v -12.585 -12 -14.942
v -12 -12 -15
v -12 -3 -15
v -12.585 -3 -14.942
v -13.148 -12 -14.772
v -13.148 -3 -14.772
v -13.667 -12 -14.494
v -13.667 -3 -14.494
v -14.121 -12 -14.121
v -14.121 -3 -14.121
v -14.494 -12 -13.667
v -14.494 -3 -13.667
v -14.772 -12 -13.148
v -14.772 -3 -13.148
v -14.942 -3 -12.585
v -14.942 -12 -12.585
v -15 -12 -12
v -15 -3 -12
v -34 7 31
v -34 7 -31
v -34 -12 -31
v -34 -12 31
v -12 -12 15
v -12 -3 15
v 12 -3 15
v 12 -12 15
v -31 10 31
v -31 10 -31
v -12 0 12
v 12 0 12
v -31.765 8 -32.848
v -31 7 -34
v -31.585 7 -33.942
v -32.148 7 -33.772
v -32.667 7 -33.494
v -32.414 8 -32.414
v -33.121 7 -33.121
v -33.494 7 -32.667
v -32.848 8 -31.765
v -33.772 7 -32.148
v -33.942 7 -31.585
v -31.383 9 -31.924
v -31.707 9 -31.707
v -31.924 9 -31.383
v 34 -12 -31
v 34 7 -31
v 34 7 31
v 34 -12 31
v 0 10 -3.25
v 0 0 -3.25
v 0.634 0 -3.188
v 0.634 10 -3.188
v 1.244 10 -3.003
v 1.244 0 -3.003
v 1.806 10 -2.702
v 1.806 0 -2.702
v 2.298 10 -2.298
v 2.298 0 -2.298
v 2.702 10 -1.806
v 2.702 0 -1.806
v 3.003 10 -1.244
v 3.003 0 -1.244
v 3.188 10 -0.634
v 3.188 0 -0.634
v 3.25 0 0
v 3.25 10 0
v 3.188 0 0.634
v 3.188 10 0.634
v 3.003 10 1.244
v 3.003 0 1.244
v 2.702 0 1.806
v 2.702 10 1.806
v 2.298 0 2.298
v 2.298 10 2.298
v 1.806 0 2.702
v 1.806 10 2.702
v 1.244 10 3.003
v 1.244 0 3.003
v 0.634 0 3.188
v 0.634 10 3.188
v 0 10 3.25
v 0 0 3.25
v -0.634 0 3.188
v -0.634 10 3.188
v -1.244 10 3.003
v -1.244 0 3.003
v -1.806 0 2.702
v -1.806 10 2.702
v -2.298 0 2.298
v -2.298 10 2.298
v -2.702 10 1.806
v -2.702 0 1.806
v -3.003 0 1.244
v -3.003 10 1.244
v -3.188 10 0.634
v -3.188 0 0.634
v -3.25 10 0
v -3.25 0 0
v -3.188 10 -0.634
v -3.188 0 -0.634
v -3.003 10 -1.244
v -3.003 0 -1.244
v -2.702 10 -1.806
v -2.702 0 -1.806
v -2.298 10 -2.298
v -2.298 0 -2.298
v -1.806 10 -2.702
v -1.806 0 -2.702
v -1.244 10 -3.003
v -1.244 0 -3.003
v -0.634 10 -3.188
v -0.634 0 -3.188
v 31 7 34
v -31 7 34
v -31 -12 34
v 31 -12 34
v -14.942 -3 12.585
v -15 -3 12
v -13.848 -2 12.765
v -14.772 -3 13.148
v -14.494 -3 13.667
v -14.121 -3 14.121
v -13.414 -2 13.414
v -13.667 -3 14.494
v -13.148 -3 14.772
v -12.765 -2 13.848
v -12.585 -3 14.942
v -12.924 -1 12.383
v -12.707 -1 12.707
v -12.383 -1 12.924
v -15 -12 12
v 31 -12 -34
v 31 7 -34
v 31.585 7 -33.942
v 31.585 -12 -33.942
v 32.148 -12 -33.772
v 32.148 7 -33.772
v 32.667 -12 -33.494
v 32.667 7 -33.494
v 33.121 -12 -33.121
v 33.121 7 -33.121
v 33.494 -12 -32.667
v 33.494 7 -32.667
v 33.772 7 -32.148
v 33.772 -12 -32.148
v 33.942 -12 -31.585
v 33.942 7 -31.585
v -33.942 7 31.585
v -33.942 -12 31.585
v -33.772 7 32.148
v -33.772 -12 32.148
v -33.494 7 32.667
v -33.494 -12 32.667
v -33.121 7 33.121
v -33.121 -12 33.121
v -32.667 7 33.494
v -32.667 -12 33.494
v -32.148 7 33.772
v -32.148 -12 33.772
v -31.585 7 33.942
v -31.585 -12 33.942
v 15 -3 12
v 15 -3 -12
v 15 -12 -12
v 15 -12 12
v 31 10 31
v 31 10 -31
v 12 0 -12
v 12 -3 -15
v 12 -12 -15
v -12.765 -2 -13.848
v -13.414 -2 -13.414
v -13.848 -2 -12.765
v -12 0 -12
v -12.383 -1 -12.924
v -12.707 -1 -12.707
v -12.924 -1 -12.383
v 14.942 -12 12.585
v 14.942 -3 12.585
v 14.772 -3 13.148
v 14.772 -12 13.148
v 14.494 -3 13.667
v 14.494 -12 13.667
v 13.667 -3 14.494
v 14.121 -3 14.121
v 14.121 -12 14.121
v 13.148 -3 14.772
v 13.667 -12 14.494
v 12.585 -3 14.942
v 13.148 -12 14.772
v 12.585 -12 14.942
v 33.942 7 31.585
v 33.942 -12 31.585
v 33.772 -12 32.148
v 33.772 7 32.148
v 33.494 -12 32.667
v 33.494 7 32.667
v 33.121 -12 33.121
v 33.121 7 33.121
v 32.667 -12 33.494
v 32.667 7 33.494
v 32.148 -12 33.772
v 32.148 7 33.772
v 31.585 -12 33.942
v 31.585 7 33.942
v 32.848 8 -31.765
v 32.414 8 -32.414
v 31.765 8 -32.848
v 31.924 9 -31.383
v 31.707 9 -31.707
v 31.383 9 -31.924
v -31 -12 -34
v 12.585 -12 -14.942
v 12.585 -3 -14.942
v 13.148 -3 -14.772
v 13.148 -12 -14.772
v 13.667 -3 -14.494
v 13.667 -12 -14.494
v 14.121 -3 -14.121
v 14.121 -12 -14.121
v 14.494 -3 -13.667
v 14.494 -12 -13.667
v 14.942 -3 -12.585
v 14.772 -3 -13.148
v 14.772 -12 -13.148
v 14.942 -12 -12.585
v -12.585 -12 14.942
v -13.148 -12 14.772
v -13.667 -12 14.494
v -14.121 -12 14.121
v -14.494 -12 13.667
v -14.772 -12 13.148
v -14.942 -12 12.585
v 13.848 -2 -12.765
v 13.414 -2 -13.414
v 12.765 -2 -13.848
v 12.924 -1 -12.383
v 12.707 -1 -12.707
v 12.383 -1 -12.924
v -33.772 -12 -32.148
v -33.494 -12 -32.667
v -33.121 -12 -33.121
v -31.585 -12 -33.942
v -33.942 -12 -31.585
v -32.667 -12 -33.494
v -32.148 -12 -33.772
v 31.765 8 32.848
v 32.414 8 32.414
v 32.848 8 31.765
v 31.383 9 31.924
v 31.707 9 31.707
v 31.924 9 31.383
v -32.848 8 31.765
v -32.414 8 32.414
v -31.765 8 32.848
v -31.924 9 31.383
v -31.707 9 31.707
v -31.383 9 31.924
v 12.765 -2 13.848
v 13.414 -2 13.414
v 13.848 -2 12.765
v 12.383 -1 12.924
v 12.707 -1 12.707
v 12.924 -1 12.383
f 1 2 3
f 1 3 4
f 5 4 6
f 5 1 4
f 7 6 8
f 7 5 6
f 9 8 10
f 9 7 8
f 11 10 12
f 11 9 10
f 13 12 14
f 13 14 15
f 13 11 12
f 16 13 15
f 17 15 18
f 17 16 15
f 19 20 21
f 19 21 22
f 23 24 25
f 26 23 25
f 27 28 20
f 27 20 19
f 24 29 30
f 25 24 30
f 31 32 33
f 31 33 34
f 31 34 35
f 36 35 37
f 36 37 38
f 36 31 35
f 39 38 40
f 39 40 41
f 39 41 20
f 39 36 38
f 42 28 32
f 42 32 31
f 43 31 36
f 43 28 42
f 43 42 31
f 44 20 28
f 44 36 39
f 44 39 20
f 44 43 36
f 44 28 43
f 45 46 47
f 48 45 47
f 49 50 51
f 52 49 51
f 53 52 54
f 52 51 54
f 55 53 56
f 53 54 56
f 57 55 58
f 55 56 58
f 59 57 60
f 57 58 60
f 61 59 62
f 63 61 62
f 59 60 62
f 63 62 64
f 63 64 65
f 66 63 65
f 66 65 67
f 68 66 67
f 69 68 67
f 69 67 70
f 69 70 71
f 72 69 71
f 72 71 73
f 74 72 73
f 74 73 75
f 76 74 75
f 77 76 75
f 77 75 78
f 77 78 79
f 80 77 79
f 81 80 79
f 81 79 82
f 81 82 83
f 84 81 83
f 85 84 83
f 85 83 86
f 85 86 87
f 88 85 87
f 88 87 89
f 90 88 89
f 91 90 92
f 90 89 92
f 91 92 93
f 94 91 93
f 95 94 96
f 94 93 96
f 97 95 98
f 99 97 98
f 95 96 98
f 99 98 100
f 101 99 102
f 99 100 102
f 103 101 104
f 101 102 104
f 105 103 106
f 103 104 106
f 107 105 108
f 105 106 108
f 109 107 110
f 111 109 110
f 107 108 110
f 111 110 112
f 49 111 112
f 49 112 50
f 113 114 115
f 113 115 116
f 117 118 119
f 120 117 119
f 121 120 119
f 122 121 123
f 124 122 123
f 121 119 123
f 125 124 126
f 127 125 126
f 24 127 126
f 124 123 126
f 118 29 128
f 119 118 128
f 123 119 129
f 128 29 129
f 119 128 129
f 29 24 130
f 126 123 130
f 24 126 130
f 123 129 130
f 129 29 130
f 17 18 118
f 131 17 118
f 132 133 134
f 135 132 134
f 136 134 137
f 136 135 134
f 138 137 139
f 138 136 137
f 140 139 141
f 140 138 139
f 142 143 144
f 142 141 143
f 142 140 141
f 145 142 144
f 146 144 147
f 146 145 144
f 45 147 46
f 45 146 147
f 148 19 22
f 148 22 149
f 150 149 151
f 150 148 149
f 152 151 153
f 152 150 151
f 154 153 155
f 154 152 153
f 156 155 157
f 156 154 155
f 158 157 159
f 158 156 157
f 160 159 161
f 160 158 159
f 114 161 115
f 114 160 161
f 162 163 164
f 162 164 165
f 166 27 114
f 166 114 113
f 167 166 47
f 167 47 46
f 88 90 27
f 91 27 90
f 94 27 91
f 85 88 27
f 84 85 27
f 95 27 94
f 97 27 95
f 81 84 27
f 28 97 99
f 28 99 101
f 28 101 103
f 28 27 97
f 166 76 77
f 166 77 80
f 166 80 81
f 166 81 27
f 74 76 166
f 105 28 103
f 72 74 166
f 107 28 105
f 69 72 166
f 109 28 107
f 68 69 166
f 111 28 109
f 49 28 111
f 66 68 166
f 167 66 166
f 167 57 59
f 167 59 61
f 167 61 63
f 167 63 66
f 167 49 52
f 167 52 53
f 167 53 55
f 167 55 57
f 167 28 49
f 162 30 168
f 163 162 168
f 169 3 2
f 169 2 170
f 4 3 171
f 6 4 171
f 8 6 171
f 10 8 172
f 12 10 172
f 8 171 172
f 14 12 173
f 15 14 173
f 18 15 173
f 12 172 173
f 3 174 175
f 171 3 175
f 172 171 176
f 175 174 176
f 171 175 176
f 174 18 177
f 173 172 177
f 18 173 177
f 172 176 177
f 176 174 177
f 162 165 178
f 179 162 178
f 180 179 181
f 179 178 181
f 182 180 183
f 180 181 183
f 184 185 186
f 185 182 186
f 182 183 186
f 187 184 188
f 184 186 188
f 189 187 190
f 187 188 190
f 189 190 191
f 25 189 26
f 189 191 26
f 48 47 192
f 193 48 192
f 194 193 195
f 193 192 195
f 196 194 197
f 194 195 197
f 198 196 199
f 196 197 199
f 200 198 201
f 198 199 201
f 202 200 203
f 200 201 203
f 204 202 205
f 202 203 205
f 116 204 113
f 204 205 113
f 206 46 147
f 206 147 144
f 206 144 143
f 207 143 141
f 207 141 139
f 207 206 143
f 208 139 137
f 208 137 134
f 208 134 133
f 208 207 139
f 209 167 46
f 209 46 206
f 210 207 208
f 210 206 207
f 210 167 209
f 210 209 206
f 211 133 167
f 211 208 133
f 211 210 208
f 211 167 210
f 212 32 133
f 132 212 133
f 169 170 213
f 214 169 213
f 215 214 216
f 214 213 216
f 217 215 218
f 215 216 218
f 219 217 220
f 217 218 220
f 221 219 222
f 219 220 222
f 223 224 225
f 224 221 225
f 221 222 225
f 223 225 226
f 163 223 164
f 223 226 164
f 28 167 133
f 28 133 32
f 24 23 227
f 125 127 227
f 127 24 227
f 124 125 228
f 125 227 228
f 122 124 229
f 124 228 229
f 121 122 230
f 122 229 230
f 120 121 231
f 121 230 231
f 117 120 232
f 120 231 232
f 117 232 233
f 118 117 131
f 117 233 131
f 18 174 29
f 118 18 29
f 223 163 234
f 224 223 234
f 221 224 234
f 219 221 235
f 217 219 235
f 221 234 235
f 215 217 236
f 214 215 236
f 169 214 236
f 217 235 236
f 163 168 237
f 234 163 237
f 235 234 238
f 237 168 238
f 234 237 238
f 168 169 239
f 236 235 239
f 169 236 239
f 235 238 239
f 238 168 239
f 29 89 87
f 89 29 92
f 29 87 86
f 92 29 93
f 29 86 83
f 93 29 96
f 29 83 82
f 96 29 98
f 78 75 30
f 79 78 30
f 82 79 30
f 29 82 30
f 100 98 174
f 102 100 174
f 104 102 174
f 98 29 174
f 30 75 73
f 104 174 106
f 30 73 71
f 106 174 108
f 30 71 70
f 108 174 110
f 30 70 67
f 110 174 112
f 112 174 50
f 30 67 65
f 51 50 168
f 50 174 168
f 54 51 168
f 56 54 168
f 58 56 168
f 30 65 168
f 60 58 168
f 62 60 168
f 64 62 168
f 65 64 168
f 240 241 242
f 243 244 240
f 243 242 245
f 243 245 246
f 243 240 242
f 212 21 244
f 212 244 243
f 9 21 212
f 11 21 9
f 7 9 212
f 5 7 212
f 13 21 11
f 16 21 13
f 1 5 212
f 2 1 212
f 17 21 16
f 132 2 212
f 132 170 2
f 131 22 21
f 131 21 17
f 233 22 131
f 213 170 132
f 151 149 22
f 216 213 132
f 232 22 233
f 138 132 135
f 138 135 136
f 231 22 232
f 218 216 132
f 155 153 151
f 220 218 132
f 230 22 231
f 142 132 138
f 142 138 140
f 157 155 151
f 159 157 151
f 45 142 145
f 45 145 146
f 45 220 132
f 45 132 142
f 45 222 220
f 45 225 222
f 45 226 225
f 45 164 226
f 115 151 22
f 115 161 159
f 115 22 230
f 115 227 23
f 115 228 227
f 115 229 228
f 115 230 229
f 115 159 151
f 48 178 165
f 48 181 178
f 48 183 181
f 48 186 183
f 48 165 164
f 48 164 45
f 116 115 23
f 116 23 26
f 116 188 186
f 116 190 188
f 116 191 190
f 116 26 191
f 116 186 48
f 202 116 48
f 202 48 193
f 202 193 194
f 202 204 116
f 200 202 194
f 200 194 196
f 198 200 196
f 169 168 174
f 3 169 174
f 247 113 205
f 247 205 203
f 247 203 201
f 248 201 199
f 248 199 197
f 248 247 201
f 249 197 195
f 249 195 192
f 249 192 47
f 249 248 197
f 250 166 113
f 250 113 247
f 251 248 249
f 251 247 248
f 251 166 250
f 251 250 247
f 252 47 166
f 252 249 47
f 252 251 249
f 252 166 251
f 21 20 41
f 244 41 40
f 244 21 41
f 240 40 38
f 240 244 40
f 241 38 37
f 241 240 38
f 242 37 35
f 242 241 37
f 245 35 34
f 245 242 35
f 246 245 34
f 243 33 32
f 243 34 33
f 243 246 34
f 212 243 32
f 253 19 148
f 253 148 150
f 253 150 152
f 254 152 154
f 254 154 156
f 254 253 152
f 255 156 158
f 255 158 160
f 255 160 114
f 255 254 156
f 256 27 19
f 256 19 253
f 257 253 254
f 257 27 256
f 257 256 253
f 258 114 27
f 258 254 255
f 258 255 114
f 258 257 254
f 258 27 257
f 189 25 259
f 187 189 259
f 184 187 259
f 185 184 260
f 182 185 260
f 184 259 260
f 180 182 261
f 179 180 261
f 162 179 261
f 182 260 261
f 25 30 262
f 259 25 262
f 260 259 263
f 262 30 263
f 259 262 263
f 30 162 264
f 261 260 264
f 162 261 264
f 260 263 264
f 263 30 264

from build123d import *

# Parameters (mm, degrees)
SKETCH1_W           = 68
SKETCH1_H           = 68
BOSS_EXTRUDE1_DEPTH = 10
SKETCH4_W           = 68
SKETCH4_H           = 68
SKETCH4_W_2         = 30
SKETCH4_H_2         = 30
BOSS_EXTRUDE3_DEPTH = 12
FILLET2_R           = 3
FILLET3_R           = 3
SKETCH5_R           = 3.25
CUT_EXTRUDE2_DEPTH  = 20
CHAMFER1_SIZE       = 3
CHAMFER2_SIZE       = 3


with BuildPart() as part:
    # Sketch1 → Boss-Extrude1 (new body)
    with BuildSketch(Plane(origin=(0, 0, 0), x_dir=(1, 0, 0), z_dir=(0, 1, 0))):
        Rectangle(SKETCH1_W, SKETCH1_H)
    extrude(amount=BOSS_EXTRUDE1_DEPTH)

    # Sketch4 → Boss-Extrude3 (add)
    with BuildSketch(Plane.XZ):
        Rectangle(SKETCH4_W, SKETCH4_H)
        Rectangle(SKETCH4_W_2, SKETCH4_H_2, mode=Mode.SUBTRACT)
    extrude(amount=BOSS_EXTRUDE3_DEPTH)

    # Fillet2
    fillet2_edges = [part.edges().sort_by_distance(p)[0] for p in [
        (34, -1, 34),
        (-34, -1, 34),
        (-34, -1, -34),
        (34, -1, -34),
    ]]
    fillet(fillet2_edges, radius=FILLET2_R)

    # Fillet3
    fillet3_edges = [part.edges().sort_by_distance(p)[0] for p in [
        (15, -6, 15),
        (-15, -6, 15),
        (-15, -6, -15),
        (15, -6, -15),
    ]]
    fillet(fillet3_edges, radius=FILLET3_R)

    # Sketch5 → Cut-Extrude2 (cut)
    with BuildSketch(Plane.XZ):
        with Locations(Location((0, 0, 0), (0, 0, 270))):
            Circle(SKETCH5_R)
    extrude(amount=-CUT_EXTRUDE2_DEPTH, mode=Mode.SUBTRACT)

    # Chamfer1
    chamfer1_edges = [part.edges().sort_by_distance(p)[0] for p in [
        (34, 10, 0),
        (0, 10, 34),
        (0, 10, -34),
        (-34, 10, 0),
        (-33.121320344, 10, -33.121320344),
        (33.121320344, 10, -33.121320344),
        (-33.121320344, 10, 33.121320344),
        (33.121320344, 10, 33.121320344),
    ]]
    chamfer(chamfer1_edges, length=CHAMFER1_SIZE - 0.0001)  # a hair under: the kernel refuses the full size

    # Chamfer2
    chamfer2_edges = [part.edges().sort_by_distance(p)[0] for p in [
        (0, 0, 15),
        (0, 0, -15),
        (15, 0, 0),
        (-15, 0, 0),
        (14.121320344, 0, 14.121320344),
        (14.121320344, 0, -14.121320344),
        (-14.121320344, 0, -14.121320344),
        (-14.121320344, 0, 14.121320344),
    ]]
    chamfer(chamfer2_edges, length=CHAMFER2_SIZE - 0.0001)  # a hair under: the kernel refuses the full size


solid = part.part
